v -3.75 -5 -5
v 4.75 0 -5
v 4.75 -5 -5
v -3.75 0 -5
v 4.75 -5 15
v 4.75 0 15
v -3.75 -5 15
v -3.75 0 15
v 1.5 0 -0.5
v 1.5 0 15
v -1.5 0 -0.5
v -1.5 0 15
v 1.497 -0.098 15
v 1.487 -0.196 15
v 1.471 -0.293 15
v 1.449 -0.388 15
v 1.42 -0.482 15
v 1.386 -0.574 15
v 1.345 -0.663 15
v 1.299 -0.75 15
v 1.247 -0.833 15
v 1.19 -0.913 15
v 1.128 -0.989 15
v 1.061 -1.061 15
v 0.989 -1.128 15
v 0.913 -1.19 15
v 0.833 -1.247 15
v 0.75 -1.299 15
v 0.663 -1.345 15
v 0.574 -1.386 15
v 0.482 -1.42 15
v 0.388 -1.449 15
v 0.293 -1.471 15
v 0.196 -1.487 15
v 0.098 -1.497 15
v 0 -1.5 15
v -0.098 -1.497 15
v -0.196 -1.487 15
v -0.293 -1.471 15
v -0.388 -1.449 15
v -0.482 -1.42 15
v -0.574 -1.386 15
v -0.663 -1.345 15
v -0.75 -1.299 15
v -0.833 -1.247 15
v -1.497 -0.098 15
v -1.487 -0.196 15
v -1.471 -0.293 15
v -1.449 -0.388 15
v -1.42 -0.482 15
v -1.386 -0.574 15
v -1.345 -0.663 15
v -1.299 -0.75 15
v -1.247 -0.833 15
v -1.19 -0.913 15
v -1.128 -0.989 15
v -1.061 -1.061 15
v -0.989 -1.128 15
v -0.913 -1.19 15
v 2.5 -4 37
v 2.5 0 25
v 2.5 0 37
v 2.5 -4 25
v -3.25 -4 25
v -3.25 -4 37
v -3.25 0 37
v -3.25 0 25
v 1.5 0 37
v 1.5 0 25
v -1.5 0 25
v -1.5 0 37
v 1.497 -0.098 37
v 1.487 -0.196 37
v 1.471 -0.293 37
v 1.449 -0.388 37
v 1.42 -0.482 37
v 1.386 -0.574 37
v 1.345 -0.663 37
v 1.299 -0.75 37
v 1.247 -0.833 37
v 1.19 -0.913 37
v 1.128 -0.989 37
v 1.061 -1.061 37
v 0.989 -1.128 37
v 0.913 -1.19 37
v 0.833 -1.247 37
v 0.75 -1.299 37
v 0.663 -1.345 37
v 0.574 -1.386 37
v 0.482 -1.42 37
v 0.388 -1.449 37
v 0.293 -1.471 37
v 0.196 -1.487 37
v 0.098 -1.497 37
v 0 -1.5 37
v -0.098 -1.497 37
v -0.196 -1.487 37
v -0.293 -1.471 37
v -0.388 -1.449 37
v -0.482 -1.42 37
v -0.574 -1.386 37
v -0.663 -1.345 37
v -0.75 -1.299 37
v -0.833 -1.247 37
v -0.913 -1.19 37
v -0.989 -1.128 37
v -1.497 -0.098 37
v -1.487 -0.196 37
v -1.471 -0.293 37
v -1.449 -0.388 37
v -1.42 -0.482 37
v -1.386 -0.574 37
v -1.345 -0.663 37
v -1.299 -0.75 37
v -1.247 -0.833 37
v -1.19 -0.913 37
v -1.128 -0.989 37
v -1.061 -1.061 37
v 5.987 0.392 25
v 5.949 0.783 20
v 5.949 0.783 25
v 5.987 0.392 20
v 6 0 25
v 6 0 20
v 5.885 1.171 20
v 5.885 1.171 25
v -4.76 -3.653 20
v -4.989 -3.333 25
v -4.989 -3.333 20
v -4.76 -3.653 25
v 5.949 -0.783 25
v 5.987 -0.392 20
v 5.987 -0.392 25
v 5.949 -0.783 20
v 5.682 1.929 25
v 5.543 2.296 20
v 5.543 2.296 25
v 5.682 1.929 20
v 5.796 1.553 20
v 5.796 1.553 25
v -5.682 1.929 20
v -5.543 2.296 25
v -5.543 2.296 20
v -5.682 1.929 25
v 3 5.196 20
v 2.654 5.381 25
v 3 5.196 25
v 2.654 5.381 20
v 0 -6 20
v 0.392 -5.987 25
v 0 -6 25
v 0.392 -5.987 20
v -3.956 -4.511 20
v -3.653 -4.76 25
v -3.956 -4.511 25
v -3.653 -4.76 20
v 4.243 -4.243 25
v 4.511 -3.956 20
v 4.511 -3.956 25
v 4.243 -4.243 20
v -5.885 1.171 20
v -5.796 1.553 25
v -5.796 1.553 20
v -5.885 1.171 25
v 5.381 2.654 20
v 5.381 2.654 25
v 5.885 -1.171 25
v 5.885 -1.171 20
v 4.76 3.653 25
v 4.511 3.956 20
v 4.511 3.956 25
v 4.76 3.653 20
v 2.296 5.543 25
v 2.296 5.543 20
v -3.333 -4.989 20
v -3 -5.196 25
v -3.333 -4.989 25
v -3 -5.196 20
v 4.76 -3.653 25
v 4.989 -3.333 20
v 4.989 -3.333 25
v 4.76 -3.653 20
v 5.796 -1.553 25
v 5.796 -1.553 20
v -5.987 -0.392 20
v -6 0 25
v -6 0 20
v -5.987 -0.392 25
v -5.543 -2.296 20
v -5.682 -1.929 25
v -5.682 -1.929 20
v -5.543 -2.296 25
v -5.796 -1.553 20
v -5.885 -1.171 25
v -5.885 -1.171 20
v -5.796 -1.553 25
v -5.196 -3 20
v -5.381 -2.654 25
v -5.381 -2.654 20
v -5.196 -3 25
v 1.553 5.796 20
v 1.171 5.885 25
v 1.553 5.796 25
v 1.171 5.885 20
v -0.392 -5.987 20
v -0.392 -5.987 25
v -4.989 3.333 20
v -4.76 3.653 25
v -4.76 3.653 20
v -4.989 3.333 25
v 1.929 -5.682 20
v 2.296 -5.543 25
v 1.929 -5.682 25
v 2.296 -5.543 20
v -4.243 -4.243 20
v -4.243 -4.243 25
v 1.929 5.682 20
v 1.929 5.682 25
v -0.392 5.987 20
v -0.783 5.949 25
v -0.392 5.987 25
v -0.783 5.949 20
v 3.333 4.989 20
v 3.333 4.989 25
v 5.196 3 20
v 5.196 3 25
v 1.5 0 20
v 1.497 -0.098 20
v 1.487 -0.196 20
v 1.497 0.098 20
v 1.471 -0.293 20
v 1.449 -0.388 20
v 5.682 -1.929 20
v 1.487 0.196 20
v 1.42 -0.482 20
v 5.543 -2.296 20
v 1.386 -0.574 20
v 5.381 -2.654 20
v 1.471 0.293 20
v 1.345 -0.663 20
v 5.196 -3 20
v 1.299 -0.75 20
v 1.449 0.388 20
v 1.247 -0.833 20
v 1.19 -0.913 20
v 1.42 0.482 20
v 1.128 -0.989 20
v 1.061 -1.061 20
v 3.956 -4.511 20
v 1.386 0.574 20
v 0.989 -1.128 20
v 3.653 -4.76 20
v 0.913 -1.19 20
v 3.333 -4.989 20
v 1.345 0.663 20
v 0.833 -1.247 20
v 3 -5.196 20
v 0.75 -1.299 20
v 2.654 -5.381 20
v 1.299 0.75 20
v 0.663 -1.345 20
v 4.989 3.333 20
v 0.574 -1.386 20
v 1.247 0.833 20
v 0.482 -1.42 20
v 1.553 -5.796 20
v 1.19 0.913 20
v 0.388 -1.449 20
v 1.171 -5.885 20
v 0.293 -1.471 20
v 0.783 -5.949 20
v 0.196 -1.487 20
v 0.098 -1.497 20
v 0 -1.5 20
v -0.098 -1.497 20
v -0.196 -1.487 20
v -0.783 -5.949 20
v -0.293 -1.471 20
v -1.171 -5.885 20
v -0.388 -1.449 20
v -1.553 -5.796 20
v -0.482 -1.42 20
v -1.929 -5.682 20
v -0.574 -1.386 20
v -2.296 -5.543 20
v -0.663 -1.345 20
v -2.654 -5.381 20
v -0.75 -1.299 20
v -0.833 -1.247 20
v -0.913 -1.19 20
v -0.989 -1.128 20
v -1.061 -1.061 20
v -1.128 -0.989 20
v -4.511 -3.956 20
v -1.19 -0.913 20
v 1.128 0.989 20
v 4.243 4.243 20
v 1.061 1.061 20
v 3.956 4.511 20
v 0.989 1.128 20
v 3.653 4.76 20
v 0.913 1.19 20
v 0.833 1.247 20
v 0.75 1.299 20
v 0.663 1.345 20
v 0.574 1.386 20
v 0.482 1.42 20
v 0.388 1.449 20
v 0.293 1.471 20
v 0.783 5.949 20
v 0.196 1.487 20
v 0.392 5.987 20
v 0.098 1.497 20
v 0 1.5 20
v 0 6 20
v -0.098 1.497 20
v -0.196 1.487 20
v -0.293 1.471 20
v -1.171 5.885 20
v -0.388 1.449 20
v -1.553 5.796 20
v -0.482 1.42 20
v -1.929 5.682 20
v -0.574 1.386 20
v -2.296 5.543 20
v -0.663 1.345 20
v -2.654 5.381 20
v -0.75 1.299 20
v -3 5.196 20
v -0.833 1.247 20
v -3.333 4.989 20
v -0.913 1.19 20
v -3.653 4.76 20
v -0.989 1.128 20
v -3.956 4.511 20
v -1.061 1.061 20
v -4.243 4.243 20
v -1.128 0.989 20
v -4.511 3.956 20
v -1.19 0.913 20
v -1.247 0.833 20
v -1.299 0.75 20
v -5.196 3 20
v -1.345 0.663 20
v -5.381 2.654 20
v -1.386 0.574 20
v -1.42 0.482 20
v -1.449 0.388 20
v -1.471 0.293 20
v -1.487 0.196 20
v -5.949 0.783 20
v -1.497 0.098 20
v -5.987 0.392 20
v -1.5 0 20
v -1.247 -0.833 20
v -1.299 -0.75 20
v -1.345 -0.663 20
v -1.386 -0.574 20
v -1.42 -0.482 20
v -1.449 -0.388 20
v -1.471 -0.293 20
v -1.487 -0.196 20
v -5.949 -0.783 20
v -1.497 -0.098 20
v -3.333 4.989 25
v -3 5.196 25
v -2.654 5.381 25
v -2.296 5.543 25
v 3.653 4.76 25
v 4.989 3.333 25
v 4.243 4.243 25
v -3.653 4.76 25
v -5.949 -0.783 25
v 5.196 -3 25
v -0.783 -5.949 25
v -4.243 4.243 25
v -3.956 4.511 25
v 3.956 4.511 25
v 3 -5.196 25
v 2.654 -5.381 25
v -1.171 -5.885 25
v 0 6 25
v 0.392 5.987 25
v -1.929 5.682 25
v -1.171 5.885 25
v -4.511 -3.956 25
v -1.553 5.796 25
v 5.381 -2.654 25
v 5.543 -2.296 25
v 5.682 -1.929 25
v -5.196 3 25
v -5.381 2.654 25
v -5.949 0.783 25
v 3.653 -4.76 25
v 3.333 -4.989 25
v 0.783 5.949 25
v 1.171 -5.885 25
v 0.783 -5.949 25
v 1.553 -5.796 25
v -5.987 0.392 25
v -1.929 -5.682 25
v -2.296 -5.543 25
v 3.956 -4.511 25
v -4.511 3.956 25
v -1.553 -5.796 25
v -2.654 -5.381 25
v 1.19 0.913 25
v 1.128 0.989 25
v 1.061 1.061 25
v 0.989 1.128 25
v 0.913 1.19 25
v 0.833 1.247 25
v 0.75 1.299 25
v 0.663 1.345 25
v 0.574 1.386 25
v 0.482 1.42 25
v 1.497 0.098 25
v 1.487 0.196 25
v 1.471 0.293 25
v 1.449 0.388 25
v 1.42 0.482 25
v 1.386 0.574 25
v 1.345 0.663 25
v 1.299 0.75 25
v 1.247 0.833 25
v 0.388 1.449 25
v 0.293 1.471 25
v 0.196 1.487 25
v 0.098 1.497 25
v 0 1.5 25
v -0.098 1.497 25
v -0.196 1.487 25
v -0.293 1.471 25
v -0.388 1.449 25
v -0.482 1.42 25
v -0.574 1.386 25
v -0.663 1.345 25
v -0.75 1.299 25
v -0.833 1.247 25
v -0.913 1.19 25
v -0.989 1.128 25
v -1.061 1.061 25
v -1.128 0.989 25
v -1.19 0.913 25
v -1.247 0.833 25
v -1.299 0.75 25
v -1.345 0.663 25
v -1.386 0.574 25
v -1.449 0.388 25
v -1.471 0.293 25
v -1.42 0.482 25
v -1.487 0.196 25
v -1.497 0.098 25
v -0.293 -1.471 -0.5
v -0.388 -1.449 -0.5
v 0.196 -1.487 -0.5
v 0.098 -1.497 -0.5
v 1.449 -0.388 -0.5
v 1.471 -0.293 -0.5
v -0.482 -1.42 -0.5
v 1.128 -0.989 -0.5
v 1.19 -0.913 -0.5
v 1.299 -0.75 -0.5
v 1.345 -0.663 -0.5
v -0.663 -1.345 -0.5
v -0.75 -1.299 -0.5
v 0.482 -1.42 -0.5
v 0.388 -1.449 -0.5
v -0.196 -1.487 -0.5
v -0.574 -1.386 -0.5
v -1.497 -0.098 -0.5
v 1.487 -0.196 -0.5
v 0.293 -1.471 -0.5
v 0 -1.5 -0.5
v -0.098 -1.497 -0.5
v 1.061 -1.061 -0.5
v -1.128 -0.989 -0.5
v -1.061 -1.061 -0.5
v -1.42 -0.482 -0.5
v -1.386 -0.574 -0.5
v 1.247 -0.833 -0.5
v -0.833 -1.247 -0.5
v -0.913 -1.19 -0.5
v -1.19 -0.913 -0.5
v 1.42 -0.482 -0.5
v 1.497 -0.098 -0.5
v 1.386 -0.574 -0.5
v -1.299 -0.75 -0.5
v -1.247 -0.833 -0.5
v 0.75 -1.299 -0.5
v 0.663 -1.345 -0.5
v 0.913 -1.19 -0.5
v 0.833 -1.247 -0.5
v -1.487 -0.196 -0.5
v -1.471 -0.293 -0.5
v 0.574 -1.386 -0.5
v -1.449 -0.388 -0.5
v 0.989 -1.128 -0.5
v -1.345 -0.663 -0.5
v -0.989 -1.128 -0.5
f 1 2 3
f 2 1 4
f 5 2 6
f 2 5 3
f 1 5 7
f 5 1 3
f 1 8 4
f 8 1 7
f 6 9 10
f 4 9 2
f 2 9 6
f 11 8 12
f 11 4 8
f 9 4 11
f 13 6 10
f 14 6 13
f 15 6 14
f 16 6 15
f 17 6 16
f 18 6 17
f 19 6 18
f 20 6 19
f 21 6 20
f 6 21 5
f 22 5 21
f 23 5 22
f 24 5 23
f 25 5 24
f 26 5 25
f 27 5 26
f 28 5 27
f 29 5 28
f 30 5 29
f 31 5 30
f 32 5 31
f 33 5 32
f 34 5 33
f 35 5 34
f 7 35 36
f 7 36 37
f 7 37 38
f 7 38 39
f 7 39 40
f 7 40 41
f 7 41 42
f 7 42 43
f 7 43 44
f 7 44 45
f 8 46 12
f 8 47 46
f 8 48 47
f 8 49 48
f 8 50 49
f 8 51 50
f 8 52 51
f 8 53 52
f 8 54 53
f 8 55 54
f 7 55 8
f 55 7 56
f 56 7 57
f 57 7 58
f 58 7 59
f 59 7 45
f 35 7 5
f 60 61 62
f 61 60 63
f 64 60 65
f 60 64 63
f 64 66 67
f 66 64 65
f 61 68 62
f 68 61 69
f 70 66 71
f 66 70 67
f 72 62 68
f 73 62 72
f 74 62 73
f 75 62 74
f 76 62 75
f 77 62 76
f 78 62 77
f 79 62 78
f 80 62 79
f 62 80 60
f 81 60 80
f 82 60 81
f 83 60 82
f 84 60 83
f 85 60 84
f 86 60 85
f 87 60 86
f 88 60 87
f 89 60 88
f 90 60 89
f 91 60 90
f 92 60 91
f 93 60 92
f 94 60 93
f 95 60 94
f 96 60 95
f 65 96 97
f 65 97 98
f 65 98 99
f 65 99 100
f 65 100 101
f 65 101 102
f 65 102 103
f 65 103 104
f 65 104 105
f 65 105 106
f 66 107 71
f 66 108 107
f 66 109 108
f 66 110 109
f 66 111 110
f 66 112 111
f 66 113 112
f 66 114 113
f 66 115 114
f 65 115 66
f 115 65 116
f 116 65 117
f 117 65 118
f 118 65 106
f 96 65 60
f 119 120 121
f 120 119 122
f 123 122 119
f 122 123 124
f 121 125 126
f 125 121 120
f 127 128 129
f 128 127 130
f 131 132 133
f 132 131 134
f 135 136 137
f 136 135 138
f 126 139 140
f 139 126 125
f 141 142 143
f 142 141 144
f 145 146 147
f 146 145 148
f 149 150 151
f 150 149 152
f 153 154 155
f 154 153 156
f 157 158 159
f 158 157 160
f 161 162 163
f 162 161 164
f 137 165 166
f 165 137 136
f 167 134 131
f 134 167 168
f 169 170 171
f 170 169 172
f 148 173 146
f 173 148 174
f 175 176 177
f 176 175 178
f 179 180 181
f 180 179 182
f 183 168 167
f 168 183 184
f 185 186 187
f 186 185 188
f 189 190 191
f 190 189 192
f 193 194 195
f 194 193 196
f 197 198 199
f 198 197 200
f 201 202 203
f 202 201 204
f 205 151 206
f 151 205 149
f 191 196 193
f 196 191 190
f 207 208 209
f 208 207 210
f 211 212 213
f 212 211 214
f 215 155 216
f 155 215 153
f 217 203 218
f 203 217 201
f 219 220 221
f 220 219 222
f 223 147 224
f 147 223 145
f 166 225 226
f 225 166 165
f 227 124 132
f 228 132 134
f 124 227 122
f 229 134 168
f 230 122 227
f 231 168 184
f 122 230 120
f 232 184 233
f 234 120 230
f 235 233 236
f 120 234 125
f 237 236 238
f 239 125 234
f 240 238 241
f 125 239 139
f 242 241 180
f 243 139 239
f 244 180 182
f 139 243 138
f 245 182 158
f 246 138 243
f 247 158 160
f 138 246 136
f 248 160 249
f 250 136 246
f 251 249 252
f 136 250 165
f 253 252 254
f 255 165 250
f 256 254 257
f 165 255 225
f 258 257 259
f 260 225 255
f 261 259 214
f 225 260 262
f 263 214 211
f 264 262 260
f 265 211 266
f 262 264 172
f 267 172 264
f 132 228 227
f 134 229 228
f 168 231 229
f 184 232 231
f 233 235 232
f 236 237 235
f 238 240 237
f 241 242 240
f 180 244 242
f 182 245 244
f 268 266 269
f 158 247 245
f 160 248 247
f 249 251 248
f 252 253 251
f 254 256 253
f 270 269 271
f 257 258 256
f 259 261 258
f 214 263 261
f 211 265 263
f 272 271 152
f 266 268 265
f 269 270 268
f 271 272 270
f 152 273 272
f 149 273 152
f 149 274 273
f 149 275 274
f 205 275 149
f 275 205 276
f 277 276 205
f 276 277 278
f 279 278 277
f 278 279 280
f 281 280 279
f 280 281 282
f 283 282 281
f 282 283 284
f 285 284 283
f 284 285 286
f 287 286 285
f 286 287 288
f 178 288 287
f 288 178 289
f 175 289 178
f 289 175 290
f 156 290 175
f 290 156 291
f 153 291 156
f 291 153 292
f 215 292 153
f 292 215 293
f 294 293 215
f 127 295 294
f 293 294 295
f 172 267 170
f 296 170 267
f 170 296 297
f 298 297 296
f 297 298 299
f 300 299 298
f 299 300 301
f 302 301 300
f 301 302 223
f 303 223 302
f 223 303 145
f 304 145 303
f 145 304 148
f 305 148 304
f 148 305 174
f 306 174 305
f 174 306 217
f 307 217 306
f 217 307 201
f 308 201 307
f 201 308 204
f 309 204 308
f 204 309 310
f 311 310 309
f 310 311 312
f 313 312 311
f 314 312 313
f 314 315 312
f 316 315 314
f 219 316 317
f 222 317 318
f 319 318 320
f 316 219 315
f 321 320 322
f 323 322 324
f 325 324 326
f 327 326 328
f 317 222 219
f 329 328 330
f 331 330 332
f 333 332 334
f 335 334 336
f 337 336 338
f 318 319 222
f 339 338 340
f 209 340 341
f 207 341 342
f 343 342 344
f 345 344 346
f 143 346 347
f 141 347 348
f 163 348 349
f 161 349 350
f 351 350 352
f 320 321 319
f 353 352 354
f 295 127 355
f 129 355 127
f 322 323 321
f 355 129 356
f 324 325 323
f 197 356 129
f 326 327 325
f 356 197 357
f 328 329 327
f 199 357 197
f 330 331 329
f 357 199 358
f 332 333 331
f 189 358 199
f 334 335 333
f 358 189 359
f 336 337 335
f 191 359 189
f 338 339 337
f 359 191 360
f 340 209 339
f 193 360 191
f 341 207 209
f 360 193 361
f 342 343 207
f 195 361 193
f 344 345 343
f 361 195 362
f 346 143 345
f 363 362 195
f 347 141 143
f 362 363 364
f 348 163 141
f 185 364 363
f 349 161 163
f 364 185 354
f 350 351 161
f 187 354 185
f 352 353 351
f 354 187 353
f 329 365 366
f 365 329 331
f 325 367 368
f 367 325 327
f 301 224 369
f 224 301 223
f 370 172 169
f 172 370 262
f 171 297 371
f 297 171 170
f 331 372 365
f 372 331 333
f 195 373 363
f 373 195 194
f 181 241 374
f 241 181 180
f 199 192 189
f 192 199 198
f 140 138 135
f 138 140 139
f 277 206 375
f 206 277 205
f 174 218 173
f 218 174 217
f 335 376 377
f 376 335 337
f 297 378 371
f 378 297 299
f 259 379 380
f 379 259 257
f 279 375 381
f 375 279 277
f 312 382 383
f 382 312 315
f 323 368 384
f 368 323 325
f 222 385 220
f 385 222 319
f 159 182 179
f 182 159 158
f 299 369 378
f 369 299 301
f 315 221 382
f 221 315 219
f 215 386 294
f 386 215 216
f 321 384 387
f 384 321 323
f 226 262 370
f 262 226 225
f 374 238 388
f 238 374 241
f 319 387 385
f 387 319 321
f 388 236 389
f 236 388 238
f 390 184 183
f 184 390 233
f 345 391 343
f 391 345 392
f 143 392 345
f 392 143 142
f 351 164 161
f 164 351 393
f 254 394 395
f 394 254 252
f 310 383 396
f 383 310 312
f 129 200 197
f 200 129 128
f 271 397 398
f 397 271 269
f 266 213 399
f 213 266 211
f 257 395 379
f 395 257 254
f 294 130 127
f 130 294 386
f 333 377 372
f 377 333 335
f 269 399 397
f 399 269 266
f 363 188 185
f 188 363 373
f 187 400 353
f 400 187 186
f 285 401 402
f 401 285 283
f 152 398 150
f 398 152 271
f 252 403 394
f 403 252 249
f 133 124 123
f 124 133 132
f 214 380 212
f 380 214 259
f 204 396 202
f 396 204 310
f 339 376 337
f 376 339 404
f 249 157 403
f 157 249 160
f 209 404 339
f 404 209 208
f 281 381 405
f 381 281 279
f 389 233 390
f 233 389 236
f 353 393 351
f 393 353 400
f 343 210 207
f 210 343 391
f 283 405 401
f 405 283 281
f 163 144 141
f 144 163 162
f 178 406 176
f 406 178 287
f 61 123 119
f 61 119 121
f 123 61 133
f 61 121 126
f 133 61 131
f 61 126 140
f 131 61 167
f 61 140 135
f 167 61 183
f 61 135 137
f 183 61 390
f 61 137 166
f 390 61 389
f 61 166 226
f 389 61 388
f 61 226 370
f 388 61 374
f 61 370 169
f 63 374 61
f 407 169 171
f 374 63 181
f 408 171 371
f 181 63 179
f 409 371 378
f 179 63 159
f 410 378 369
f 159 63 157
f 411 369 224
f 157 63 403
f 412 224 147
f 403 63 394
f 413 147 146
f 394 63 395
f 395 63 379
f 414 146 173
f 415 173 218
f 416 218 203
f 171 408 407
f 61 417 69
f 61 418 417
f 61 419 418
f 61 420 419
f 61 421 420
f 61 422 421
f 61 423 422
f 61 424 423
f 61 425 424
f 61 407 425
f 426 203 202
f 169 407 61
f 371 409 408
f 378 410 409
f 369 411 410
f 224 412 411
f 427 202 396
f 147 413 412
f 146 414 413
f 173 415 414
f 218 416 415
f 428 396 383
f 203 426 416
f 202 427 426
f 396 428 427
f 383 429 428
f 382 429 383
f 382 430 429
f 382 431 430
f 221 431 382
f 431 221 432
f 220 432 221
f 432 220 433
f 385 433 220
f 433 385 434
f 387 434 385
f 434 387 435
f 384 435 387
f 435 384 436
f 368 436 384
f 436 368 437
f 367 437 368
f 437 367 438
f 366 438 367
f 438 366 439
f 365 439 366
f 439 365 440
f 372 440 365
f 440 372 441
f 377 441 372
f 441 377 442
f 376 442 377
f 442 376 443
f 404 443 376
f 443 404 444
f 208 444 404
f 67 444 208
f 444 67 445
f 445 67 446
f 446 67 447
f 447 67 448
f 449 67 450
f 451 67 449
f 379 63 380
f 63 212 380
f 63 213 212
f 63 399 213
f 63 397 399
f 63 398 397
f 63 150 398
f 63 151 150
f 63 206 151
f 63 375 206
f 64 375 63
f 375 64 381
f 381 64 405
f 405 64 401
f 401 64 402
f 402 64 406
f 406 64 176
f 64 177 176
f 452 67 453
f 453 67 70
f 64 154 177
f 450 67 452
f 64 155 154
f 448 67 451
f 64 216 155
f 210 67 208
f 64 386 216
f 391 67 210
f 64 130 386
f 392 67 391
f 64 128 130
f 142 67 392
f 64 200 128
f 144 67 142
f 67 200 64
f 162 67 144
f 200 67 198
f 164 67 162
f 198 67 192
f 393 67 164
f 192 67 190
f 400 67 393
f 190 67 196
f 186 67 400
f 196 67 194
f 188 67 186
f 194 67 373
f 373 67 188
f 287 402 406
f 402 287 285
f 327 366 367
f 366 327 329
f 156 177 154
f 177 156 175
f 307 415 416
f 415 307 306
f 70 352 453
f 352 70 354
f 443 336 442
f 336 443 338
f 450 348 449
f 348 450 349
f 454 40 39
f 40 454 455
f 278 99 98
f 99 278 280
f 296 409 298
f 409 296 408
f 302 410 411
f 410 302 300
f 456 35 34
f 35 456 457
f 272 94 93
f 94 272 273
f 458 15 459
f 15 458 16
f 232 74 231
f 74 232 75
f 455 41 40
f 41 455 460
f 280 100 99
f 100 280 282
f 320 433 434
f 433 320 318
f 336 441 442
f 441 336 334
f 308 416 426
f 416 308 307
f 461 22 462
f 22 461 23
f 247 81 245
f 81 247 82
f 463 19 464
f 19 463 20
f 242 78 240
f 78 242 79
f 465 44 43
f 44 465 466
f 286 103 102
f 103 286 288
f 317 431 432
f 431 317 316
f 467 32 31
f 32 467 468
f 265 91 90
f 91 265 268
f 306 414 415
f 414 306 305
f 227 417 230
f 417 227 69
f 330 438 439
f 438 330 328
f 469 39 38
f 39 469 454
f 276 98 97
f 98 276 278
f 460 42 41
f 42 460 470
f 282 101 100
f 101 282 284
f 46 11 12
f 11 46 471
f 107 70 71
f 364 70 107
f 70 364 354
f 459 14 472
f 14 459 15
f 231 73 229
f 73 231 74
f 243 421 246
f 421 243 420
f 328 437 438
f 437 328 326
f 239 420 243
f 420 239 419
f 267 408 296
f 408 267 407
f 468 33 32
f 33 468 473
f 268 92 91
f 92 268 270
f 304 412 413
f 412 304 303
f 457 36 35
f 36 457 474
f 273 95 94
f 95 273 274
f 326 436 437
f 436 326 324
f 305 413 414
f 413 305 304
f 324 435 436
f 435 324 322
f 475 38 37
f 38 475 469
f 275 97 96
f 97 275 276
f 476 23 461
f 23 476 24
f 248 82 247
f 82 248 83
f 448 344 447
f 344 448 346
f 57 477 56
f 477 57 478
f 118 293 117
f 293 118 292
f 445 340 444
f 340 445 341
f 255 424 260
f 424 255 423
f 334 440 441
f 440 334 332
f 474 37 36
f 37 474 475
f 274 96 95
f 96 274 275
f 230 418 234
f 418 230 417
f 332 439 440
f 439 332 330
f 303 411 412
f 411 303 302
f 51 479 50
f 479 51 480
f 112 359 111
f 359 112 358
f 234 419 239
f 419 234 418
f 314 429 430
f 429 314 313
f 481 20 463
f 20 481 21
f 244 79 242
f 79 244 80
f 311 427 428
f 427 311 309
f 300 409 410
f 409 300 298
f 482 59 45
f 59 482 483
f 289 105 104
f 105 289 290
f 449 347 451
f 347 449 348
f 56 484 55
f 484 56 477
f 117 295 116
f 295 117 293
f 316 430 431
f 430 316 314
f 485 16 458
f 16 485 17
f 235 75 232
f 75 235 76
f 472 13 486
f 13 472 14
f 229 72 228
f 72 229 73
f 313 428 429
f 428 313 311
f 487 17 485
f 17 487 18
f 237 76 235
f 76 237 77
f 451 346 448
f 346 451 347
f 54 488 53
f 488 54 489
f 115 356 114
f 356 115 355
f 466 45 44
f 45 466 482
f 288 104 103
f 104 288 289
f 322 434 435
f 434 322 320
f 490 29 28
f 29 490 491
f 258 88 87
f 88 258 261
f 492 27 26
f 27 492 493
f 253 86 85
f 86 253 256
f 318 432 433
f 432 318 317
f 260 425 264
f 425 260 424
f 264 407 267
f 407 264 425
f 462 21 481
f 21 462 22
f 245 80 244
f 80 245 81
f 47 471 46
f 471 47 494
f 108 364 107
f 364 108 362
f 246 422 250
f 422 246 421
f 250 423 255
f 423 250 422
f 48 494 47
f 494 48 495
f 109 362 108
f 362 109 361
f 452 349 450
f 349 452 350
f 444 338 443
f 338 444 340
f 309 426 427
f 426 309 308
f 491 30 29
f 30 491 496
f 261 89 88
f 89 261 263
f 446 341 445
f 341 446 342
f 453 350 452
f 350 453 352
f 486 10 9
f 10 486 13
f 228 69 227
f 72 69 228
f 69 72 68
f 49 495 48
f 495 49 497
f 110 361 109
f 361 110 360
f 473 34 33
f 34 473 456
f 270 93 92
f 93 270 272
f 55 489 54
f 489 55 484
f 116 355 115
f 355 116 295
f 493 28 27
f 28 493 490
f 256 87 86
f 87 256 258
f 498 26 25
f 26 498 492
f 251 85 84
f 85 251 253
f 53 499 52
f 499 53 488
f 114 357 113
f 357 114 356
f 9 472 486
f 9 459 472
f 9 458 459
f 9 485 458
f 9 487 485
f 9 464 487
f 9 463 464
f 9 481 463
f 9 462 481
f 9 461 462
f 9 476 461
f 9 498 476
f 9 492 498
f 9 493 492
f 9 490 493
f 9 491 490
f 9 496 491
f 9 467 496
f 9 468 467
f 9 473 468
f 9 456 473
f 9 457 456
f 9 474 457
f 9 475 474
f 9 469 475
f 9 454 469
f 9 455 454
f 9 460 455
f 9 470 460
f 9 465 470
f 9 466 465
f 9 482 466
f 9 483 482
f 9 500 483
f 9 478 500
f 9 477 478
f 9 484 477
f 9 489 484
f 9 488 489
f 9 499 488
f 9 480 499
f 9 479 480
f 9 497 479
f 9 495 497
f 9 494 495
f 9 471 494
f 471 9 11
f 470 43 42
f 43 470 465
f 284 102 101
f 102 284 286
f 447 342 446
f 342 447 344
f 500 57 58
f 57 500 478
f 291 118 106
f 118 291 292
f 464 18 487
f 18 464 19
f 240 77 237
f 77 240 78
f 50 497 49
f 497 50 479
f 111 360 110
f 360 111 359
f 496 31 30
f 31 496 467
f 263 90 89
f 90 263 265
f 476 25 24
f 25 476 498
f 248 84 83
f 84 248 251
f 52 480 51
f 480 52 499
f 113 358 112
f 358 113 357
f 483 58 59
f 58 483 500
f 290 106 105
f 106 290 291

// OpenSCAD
// Straight hose-barb reducer: 8 mm tubing (z = 0..20) -> 5 mm tubing (z = 25..41)
// Print orientation: standing upright along +Z, centred on origin in X/Y

$fn = 96;

// ---- Dimensions (mm) ----
tube_d1      = 8;    // first tubing inner diameter
tube_d2      = 5;    // second tubing inner diameter
bore_d       = 3;    // through-bore diameter
barb_h1      = 10;   // first barb height
barb_od1_bot = 7.5;  // first barb outer diameter at bottom
barb_od1_top = 9.5;  // first barb outer diameter at top
collar_d     = 12;   // collar diameter (z = 20..25)
barb_h2      = 8;    // second barb height
barb_od2_bot = 6.5;  // second barb outer diameter at bottom
barb_od2_top = 5.0;  // second barb outer diameter at top
eps          = 0.5;  // overshoot for clean cuts

total_len    = 41;   // overall length (z = 0..41)

// ---- Model ----
difference() {
    union() {
        // z = 0..20: two identical barbs for 8 mm tubing, stacked
        for (s = [-1, 1])
            translate([0, 0, s * (barb_h1 / 2)])
                linear_extrude(height = barb_h1)
                    polygon(points = [
                        [-barb_od1_bot / 2, 0],
                        [ barb_od1_top / 2, 0],
                        [ barb_od1_top / 2, -barb_h1 / 2],
                        [-barb_od1_bot / 2, -barb_h1 / 2]
                    ]);

        // z = 20..25: cylindrical collar
        translate([0, 0, 20])
            cylinder(d = collar_d, h = 5);

        // z = 25..41: two identical barbs for 5 mm tubing, stacked
        for (s = [-1, 1])
            translate([0, 0, 25 + s * (barb_h2 / 2)])
                linear_extrude(height = barb_h2)
                    polygon(points = [
                        [-barb_od2_bot / 2, 0],
                        [ barb_od2_top / 2, 0],
                        [ barb_od2_top / 2, -barb_h2 / 2],
                        [-barb_od2_bot / 2, -barb_h2 / 2]
                    ]);
    }

    // through-bore along Z, extending past both end faces
    translate([0, 0, -eps])
        cylinder(d = bore_d, h = total_len + 2 * eps);
}
